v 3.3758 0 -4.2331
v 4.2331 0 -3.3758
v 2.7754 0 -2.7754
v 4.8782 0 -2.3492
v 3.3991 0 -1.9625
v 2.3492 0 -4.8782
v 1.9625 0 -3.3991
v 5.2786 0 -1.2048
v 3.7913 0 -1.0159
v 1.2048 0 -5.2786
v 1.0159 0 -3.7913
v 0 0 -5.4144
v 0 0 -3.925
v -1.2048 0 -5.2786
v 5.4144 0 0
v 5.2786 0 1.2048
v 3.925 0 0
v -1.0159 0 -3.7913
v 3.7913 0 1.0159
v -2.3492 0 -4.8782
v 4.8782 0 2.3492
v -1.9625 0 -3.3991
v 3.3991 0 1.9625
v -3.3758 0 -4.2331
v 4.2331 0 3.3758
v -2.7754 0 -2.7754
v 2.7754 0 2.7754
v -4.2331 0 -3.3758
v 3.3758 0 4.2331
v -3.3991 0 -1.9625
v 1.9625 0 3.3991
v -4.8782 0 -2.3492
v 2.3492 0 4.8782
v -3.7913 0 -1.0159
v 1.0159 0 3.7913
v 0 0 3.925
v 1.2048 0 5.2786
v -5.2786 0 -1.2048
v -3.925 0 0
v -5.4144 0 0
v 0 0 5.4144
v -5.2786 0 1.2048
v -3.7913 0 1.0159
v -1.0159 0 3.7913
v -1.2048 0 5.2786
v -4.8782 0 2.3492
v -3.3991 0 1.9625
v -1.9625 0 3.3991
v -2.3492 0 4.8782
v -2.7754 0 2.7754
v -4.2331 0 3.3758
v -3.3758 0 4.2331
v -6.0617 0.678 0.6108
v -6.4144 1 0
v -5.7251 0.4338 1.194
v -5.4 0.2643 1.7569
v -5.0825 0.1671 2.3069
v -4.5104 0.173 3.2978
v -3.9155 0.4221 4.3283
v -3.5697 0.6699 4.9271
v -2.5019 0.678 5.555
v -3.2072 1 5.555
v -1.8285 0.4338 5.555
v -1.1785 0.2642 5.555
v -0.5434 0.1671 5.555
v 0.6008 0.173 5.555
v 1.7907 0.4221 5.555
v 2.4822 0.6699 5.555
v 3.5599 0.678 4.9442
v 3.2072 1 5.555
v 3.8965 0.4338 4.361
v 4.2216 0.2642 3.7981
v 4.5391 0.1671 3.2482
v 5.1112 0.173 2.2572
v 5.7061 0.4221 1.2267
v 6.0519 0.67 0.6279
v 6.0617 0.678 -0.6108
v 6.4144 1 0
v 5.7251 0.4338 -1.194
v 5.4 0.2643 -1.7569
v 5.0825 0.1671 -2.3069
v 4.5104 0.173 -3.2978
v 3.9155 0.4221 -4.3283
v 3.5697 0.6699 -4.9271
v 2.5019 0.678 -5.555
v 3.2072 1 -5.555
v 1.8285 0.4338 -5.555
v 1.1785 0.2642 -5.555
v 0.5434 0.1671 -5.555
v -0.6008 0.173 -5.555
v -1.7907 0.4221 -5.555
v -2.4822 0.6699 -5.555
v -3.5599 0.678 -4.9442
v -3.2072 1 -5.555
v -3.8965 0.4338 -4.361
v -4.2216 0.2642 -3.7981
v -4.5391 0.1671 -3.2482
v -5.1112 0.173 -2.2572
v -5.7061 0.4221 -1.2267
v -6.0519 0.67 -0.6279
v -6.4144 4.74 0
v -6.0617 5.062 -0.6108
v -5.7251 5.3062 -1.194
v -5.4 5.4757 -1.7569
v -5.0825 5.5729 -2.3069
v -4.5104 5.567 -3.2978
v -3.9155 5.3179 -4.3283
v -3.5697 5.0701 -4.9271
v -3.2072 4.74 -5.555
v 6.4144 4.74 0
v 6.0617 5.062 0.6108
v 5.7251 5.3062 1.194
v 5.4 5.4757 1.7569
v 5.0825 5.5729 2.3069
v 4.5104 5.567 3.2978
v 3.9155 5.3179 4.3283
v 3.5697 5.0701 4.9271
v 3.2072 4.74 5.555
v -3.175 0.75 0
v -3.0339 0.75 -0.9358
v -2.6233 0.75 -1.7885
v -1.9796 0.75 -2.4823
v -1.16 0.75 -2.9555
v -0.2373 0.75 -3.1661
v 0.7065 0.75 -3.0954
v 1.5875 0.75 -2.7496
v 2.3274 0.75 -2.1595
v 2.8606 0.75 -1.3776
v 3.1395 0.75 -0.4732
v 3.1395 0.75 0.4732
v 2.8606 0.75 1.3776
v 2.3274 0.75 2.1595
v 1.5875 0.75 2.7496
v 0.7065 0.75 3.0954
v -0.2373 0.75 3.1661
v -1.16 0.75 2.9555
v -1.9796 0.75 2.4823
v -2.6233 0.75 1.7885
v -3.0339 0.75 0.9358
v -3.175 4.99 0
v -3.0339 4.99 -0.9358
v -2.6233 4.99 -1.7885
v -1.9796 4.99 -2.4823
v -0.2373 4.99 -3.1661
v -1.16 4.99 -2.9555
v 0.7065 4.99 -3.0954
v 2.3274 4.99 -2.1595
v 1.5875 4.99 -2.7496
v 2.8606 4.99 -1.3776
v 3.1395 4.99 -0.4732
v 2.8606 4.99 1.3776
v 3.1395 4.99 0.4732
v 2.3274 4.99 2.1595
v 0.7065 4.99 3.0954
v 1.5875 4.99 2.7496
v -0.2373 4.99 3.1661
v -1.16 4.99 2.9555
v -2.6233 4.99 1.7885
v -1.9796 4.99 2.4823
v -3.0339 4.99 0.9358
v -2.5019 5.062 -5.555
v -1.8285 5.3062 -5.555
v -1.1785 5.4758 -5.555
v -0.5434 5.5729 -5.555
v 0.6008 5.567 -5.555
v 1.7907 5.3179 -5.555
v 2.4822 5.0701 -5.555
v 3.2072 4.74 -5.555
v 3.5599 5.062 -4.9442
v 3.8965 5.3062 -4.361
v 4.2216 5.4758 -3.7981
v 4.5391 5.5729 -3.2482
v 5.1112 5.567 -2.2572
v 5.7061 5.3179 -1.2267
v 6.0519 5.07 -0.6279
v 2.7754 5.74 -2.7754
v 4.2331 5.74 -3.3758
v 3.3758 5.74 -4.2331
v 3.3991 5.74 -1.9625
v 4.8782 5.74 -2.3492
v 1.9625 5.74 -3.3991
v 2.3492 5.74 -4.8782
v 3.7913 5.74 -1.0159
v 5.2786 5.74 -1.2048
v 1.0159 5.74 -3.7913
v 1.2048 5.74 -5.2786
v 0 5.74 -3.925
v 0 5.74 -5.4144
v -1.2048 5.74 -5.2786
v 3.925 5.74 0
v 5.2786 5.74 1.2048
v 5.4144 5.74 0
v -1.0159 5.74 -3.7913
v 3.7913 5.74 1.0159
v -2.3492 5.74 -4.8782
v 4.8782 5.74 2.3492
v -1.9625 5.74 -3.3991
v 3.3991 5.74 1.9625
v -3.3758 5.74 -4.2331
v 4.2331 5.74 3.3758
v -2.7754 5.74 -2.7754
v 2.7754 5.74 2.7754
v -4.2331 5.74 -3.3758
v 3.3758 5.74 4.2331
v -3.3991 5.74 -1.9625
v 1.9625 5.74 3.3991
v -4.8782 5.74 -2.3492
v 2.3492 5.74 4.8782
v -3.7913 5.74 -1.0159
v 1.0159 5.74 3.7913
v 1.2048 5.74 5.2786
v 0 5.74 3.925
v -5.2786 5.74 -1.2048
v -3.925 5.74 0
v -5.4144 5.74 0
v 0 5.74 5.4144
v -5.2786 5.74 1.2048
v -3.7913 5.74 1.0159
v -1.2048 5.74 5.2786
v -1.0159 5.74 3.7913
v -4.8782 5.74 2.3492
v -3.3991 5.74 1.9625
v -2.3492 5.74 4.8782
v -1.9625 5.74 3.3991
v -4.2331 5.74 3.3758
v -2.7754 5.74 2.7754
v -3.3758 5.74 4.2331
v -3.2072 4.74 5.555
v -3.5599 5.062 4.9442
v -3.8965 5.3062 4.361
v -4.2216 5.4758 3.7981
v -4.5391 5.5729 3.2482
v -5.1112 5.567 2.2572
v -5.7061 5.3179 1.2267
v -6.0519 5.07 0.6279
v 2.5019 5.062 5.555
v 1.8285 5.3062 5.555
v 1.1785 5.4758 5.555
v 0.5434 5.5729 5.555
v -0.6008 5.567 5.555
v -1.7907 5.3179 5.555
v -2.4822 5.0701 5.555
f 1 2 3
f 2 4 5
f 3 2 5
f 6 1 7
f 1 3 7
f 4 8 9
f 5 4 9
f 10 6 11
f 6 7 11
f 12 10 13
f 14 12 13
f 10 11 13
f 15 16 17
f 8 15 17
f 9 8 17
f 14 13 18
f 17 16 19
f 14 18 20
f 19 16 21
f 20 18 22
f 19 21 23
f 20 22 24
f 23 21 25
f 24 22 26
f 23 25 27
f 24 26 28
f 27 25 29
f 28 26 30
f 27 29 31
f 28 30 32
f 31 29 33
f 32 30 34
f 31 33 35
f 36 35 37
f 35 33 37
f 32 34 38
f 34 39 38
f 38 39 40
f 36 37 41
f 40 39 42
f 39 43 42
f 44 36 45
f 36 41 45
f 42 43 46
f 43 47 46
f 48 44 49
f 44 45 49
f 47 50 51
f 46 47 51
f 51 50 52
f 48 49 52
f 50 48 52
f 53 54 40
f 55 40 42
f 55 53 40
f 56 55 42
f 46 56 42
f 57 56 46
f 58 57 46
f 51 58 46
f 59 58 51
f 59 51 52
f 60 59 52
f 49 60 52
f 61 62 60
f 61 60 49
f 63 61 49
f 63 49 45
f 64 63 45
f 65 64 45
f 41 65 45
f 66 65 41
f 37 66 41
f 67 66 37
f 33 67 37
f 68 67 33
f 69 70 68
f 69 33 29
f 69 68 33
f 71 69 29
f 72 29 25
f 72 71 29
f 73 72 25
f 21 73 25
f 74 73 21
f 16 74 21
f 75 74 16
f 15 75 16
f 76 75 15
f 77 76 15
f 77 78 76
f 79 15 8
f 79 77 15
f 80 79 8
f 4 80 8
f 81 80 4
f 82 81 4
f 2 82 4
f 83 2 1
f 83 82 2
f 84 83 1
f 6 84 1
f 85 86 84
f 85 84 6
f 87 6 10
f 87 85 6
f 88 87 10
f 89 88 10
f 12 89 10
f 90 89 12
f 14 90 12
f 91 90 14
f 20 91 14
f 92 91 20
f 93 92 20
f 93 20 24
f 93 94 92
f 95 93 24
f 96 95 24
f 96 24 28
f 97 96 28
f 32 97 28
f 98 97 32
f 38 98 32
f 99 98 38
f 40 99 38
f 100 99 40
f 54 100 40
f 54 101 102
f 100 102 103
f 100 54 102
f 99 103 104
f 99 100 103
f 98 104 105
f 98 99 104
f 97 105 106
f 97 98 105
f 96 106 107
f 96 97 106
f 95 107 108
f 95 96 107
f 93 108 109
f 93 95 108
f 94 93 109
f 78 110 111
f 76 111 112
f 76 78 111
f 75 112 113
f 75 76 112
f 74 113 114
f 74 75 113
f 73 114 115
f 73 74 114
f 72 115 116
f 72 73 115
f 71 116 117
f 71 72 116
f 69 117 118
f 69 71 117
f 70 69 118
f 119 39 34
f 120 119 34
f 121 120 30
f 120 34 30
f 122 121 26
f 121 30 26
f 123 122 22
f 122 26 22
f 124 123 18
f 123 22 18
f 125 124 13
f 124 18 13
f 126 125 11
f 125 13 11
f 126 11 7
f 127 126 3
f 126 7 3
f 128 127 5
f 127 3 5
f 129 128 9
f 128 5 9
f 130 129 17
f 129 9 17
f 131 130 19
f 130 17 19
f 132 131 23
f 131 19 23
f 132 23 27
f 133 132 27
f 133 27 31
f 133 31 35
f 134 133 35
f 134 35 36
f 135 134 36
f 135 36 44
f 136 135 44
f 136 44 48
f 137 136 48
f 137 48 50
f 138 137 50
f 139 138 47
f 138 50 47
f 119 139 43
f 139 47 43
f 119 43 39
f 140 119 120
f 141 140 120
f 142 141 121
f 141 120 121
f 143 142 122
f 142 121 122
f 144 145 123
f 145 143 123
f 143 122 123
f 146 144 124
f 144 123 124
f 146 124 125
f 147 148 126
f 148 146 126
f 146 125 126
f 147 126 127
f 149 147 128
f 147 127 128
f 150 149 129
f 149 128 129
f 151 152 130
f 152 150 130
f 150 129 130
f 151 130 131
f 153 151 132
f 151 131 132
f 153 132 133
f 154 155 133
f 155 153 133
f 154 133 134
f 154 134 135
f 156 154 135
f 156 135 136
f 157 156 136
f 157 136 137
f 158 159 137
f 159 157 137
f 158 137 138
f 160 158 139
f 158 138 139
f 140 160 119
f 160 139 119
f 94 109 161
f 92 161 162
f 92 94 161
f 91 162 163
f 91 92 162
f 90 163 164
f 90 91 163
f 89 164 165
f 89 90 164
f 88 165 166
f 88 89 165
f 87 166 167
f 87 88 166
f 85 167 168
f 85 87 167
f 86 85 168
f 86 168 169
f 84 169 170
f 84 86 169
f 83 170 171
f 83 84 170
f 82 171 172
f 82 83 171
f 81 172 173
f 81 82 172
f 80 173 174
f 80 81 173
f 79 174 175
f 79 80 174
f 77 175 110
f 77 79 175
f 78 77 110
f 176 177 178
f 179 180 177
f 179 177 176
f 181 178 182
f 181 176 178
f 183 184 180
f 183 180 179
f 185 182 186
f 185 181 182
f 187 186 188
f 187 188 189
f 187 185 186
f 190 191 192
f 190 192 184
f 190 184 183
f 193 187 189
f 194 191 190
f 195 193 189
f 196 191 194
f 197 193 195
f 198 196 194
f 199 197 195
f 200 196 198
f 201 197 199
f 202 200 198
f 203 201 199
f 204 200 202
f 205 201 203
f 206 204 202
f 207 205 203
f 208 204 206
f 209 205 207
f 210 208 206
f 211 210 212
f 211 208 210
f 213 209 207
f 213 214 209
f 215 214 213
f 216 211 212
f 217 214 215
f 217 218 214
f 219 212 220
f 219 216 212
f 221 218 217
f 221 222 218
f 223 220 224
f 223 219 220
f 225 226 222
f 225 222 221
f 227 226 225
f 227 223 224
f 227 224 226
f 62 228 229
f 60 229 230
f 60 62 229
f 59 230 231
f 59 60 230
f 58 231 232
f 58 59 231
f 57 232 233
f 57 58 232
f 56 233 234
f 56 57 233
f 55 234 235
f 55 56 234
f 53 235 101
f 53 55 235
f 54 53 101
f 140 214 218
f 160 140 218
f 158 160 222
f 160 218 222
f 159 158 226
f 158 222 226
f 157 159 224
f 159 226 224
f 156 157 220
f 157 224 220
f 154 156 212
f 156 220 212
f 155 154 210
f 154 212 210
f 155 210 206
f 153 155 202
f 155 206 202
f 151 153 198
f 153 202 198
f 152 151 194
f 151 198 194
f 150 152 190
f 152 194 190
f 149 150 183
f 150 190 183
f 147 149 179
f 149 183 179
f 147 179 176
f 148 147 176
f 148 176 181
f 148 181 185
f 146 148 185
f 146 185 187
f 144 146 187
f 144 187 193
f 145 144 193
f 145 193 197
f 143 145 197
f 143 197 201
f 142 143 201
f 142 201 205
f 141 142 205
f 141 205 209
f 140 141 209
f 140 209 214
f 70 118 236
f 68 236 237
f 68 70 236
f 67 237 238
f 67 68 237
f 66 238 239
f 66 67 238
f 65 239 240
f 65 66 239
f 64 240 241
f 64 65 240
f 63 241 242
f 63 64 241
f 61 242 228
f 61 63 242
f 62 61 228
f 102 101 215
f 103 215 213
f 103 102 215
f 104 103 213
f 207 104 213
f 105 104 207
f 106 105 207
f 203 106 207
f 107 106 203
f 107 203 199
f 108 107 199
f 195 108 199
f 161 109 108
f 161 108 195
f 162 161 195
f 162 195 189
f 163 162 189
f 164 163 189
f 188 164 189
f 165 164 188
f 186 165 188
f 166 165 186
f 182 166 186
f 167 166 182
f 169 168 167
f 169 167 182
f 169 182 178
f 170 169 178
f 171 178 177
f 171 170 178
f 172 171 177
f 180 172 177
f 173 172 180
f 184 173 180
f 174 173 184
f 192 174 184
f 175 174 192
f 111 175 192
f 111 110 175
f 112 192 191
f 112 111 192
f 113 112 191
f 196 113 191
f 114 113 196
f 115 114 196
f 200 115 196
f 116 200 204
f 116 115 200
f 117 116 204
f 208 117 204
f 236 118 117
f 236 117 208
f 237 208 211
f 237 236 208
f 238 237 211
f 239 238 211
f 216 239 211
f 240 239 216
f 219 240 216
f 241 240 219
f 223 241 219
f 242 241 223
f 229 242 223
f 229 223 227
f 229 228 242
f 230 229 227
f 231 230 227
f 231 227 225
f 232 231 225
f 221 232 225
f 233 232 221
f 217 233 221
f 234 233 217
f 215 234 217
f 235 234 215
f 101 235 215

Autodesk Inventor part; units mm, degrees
ref_plane "YZ Plane" through (0, 0, 0) normal (1, 0, 0) x (0, 1, 0)
ref_plane "XZ Plane" through (0, 0, 0) normal (0, 1, 0) x (-1, 0, 0)
ref_plane "XY Plane" through (0, 0, 0) normal (0, 0, 1) x (1, 0, 0)
sketch "Esboço1" plane through (0, 0, 0) normal (0, 1, 0) x (-1, 0, 0)
  circle A0 centre (0, 0) radius 3.175
  line L0 (-3.2072, -5.555) -> (-6.4144, 0)
  line L1 (-6.4144, 0) -> (-3.2072, 5.555)
  line L2 (-3.2072, 5.555) -> (3.2072, 5.555)
  line L3 (3.2072, 5.555) -> (6.4144, 0)
  line L4 (6.4144, 0) -> (3.2072, -5.555)
  line L5 (3.2072, -5.555) -> (-3.2072, -5.555)
  dimension "d0" = 6.35
extrude "Extrusão1" add sketch "Esboço1" along normal blind 5.74
thread "Rosca1" size "1/4-20 UNC" class "2B" standard "ANSI Unified Screw Threads" full length
sketch "Esboço2" plane through (0, 0, 0) normal (0, 0, 1) x (1, 0, 0)
  line L0 (0, 0) -> (-3.175, 0)
  line L1 (3.2072, 5.74) -> (-3.2072, 5.74) projected
  line L2 (-3.2072, 5.74) -> (-6.4144, 5.74) projected
  line L3 (0, 0) -> (0, 10.6611)
  line L4 (-6.4144, 4.74) -> (-5.4144, 5.74)
  line L5 (-3.175, 4.99) -> (-3.925, 5.74)
  line L6 (-3.2072, 2.87) -> (-11.6119, 2.87)
  line L7 (-6.4144, 4.74) -> (-6.4144, 5.74)
  line L8 (-6.4144, 5.74) -> (-5.4144, 5.74)
  line L9 (-3.925, 5.74) -> (-3.175, 5.74)
  line L10 (-3.175, 4.99) -> (-3.175, 5.74)
  line L11 (-3.2072, 0) -> (-6.4144, 0)
  line L12 (-6.4144, 1) -> (-5.4144, 0)
  line L13 (-3.175, 0.75) -> (-3.925, 0)
  line L14 (-6.4144, 1) -> (-6.4144, 0)
  line L15 (-6.4144, 0) -> (-5.4144, 0)
  line L16 (-3.925, 0) -> (-3.175, 0)
  line L17 (-3.175, 0.75) -> (-3.175, 0)
  line L18 (-6.4144, 0) -> (-3.2072, 0) projected
  line L19 (-6.4144, 0) -> (-5.4144, 0)
  point P0 (-3.175, 5.74)
  dimension "d6" = 1
  dimension "d7" = 1
  dimension "d8" = 0.75
  dimension "d9" = 0.75
revolve "Revolução1" cut sketch "Esboço2" angle 360 about axis through (0, 0, 0) along (0, 1, 0)
equation "\"d7\" = d6"
equation "\"d9\" = d8"
properties part number "Porca sextavada 1 quarto" material "Aço, carbono"
